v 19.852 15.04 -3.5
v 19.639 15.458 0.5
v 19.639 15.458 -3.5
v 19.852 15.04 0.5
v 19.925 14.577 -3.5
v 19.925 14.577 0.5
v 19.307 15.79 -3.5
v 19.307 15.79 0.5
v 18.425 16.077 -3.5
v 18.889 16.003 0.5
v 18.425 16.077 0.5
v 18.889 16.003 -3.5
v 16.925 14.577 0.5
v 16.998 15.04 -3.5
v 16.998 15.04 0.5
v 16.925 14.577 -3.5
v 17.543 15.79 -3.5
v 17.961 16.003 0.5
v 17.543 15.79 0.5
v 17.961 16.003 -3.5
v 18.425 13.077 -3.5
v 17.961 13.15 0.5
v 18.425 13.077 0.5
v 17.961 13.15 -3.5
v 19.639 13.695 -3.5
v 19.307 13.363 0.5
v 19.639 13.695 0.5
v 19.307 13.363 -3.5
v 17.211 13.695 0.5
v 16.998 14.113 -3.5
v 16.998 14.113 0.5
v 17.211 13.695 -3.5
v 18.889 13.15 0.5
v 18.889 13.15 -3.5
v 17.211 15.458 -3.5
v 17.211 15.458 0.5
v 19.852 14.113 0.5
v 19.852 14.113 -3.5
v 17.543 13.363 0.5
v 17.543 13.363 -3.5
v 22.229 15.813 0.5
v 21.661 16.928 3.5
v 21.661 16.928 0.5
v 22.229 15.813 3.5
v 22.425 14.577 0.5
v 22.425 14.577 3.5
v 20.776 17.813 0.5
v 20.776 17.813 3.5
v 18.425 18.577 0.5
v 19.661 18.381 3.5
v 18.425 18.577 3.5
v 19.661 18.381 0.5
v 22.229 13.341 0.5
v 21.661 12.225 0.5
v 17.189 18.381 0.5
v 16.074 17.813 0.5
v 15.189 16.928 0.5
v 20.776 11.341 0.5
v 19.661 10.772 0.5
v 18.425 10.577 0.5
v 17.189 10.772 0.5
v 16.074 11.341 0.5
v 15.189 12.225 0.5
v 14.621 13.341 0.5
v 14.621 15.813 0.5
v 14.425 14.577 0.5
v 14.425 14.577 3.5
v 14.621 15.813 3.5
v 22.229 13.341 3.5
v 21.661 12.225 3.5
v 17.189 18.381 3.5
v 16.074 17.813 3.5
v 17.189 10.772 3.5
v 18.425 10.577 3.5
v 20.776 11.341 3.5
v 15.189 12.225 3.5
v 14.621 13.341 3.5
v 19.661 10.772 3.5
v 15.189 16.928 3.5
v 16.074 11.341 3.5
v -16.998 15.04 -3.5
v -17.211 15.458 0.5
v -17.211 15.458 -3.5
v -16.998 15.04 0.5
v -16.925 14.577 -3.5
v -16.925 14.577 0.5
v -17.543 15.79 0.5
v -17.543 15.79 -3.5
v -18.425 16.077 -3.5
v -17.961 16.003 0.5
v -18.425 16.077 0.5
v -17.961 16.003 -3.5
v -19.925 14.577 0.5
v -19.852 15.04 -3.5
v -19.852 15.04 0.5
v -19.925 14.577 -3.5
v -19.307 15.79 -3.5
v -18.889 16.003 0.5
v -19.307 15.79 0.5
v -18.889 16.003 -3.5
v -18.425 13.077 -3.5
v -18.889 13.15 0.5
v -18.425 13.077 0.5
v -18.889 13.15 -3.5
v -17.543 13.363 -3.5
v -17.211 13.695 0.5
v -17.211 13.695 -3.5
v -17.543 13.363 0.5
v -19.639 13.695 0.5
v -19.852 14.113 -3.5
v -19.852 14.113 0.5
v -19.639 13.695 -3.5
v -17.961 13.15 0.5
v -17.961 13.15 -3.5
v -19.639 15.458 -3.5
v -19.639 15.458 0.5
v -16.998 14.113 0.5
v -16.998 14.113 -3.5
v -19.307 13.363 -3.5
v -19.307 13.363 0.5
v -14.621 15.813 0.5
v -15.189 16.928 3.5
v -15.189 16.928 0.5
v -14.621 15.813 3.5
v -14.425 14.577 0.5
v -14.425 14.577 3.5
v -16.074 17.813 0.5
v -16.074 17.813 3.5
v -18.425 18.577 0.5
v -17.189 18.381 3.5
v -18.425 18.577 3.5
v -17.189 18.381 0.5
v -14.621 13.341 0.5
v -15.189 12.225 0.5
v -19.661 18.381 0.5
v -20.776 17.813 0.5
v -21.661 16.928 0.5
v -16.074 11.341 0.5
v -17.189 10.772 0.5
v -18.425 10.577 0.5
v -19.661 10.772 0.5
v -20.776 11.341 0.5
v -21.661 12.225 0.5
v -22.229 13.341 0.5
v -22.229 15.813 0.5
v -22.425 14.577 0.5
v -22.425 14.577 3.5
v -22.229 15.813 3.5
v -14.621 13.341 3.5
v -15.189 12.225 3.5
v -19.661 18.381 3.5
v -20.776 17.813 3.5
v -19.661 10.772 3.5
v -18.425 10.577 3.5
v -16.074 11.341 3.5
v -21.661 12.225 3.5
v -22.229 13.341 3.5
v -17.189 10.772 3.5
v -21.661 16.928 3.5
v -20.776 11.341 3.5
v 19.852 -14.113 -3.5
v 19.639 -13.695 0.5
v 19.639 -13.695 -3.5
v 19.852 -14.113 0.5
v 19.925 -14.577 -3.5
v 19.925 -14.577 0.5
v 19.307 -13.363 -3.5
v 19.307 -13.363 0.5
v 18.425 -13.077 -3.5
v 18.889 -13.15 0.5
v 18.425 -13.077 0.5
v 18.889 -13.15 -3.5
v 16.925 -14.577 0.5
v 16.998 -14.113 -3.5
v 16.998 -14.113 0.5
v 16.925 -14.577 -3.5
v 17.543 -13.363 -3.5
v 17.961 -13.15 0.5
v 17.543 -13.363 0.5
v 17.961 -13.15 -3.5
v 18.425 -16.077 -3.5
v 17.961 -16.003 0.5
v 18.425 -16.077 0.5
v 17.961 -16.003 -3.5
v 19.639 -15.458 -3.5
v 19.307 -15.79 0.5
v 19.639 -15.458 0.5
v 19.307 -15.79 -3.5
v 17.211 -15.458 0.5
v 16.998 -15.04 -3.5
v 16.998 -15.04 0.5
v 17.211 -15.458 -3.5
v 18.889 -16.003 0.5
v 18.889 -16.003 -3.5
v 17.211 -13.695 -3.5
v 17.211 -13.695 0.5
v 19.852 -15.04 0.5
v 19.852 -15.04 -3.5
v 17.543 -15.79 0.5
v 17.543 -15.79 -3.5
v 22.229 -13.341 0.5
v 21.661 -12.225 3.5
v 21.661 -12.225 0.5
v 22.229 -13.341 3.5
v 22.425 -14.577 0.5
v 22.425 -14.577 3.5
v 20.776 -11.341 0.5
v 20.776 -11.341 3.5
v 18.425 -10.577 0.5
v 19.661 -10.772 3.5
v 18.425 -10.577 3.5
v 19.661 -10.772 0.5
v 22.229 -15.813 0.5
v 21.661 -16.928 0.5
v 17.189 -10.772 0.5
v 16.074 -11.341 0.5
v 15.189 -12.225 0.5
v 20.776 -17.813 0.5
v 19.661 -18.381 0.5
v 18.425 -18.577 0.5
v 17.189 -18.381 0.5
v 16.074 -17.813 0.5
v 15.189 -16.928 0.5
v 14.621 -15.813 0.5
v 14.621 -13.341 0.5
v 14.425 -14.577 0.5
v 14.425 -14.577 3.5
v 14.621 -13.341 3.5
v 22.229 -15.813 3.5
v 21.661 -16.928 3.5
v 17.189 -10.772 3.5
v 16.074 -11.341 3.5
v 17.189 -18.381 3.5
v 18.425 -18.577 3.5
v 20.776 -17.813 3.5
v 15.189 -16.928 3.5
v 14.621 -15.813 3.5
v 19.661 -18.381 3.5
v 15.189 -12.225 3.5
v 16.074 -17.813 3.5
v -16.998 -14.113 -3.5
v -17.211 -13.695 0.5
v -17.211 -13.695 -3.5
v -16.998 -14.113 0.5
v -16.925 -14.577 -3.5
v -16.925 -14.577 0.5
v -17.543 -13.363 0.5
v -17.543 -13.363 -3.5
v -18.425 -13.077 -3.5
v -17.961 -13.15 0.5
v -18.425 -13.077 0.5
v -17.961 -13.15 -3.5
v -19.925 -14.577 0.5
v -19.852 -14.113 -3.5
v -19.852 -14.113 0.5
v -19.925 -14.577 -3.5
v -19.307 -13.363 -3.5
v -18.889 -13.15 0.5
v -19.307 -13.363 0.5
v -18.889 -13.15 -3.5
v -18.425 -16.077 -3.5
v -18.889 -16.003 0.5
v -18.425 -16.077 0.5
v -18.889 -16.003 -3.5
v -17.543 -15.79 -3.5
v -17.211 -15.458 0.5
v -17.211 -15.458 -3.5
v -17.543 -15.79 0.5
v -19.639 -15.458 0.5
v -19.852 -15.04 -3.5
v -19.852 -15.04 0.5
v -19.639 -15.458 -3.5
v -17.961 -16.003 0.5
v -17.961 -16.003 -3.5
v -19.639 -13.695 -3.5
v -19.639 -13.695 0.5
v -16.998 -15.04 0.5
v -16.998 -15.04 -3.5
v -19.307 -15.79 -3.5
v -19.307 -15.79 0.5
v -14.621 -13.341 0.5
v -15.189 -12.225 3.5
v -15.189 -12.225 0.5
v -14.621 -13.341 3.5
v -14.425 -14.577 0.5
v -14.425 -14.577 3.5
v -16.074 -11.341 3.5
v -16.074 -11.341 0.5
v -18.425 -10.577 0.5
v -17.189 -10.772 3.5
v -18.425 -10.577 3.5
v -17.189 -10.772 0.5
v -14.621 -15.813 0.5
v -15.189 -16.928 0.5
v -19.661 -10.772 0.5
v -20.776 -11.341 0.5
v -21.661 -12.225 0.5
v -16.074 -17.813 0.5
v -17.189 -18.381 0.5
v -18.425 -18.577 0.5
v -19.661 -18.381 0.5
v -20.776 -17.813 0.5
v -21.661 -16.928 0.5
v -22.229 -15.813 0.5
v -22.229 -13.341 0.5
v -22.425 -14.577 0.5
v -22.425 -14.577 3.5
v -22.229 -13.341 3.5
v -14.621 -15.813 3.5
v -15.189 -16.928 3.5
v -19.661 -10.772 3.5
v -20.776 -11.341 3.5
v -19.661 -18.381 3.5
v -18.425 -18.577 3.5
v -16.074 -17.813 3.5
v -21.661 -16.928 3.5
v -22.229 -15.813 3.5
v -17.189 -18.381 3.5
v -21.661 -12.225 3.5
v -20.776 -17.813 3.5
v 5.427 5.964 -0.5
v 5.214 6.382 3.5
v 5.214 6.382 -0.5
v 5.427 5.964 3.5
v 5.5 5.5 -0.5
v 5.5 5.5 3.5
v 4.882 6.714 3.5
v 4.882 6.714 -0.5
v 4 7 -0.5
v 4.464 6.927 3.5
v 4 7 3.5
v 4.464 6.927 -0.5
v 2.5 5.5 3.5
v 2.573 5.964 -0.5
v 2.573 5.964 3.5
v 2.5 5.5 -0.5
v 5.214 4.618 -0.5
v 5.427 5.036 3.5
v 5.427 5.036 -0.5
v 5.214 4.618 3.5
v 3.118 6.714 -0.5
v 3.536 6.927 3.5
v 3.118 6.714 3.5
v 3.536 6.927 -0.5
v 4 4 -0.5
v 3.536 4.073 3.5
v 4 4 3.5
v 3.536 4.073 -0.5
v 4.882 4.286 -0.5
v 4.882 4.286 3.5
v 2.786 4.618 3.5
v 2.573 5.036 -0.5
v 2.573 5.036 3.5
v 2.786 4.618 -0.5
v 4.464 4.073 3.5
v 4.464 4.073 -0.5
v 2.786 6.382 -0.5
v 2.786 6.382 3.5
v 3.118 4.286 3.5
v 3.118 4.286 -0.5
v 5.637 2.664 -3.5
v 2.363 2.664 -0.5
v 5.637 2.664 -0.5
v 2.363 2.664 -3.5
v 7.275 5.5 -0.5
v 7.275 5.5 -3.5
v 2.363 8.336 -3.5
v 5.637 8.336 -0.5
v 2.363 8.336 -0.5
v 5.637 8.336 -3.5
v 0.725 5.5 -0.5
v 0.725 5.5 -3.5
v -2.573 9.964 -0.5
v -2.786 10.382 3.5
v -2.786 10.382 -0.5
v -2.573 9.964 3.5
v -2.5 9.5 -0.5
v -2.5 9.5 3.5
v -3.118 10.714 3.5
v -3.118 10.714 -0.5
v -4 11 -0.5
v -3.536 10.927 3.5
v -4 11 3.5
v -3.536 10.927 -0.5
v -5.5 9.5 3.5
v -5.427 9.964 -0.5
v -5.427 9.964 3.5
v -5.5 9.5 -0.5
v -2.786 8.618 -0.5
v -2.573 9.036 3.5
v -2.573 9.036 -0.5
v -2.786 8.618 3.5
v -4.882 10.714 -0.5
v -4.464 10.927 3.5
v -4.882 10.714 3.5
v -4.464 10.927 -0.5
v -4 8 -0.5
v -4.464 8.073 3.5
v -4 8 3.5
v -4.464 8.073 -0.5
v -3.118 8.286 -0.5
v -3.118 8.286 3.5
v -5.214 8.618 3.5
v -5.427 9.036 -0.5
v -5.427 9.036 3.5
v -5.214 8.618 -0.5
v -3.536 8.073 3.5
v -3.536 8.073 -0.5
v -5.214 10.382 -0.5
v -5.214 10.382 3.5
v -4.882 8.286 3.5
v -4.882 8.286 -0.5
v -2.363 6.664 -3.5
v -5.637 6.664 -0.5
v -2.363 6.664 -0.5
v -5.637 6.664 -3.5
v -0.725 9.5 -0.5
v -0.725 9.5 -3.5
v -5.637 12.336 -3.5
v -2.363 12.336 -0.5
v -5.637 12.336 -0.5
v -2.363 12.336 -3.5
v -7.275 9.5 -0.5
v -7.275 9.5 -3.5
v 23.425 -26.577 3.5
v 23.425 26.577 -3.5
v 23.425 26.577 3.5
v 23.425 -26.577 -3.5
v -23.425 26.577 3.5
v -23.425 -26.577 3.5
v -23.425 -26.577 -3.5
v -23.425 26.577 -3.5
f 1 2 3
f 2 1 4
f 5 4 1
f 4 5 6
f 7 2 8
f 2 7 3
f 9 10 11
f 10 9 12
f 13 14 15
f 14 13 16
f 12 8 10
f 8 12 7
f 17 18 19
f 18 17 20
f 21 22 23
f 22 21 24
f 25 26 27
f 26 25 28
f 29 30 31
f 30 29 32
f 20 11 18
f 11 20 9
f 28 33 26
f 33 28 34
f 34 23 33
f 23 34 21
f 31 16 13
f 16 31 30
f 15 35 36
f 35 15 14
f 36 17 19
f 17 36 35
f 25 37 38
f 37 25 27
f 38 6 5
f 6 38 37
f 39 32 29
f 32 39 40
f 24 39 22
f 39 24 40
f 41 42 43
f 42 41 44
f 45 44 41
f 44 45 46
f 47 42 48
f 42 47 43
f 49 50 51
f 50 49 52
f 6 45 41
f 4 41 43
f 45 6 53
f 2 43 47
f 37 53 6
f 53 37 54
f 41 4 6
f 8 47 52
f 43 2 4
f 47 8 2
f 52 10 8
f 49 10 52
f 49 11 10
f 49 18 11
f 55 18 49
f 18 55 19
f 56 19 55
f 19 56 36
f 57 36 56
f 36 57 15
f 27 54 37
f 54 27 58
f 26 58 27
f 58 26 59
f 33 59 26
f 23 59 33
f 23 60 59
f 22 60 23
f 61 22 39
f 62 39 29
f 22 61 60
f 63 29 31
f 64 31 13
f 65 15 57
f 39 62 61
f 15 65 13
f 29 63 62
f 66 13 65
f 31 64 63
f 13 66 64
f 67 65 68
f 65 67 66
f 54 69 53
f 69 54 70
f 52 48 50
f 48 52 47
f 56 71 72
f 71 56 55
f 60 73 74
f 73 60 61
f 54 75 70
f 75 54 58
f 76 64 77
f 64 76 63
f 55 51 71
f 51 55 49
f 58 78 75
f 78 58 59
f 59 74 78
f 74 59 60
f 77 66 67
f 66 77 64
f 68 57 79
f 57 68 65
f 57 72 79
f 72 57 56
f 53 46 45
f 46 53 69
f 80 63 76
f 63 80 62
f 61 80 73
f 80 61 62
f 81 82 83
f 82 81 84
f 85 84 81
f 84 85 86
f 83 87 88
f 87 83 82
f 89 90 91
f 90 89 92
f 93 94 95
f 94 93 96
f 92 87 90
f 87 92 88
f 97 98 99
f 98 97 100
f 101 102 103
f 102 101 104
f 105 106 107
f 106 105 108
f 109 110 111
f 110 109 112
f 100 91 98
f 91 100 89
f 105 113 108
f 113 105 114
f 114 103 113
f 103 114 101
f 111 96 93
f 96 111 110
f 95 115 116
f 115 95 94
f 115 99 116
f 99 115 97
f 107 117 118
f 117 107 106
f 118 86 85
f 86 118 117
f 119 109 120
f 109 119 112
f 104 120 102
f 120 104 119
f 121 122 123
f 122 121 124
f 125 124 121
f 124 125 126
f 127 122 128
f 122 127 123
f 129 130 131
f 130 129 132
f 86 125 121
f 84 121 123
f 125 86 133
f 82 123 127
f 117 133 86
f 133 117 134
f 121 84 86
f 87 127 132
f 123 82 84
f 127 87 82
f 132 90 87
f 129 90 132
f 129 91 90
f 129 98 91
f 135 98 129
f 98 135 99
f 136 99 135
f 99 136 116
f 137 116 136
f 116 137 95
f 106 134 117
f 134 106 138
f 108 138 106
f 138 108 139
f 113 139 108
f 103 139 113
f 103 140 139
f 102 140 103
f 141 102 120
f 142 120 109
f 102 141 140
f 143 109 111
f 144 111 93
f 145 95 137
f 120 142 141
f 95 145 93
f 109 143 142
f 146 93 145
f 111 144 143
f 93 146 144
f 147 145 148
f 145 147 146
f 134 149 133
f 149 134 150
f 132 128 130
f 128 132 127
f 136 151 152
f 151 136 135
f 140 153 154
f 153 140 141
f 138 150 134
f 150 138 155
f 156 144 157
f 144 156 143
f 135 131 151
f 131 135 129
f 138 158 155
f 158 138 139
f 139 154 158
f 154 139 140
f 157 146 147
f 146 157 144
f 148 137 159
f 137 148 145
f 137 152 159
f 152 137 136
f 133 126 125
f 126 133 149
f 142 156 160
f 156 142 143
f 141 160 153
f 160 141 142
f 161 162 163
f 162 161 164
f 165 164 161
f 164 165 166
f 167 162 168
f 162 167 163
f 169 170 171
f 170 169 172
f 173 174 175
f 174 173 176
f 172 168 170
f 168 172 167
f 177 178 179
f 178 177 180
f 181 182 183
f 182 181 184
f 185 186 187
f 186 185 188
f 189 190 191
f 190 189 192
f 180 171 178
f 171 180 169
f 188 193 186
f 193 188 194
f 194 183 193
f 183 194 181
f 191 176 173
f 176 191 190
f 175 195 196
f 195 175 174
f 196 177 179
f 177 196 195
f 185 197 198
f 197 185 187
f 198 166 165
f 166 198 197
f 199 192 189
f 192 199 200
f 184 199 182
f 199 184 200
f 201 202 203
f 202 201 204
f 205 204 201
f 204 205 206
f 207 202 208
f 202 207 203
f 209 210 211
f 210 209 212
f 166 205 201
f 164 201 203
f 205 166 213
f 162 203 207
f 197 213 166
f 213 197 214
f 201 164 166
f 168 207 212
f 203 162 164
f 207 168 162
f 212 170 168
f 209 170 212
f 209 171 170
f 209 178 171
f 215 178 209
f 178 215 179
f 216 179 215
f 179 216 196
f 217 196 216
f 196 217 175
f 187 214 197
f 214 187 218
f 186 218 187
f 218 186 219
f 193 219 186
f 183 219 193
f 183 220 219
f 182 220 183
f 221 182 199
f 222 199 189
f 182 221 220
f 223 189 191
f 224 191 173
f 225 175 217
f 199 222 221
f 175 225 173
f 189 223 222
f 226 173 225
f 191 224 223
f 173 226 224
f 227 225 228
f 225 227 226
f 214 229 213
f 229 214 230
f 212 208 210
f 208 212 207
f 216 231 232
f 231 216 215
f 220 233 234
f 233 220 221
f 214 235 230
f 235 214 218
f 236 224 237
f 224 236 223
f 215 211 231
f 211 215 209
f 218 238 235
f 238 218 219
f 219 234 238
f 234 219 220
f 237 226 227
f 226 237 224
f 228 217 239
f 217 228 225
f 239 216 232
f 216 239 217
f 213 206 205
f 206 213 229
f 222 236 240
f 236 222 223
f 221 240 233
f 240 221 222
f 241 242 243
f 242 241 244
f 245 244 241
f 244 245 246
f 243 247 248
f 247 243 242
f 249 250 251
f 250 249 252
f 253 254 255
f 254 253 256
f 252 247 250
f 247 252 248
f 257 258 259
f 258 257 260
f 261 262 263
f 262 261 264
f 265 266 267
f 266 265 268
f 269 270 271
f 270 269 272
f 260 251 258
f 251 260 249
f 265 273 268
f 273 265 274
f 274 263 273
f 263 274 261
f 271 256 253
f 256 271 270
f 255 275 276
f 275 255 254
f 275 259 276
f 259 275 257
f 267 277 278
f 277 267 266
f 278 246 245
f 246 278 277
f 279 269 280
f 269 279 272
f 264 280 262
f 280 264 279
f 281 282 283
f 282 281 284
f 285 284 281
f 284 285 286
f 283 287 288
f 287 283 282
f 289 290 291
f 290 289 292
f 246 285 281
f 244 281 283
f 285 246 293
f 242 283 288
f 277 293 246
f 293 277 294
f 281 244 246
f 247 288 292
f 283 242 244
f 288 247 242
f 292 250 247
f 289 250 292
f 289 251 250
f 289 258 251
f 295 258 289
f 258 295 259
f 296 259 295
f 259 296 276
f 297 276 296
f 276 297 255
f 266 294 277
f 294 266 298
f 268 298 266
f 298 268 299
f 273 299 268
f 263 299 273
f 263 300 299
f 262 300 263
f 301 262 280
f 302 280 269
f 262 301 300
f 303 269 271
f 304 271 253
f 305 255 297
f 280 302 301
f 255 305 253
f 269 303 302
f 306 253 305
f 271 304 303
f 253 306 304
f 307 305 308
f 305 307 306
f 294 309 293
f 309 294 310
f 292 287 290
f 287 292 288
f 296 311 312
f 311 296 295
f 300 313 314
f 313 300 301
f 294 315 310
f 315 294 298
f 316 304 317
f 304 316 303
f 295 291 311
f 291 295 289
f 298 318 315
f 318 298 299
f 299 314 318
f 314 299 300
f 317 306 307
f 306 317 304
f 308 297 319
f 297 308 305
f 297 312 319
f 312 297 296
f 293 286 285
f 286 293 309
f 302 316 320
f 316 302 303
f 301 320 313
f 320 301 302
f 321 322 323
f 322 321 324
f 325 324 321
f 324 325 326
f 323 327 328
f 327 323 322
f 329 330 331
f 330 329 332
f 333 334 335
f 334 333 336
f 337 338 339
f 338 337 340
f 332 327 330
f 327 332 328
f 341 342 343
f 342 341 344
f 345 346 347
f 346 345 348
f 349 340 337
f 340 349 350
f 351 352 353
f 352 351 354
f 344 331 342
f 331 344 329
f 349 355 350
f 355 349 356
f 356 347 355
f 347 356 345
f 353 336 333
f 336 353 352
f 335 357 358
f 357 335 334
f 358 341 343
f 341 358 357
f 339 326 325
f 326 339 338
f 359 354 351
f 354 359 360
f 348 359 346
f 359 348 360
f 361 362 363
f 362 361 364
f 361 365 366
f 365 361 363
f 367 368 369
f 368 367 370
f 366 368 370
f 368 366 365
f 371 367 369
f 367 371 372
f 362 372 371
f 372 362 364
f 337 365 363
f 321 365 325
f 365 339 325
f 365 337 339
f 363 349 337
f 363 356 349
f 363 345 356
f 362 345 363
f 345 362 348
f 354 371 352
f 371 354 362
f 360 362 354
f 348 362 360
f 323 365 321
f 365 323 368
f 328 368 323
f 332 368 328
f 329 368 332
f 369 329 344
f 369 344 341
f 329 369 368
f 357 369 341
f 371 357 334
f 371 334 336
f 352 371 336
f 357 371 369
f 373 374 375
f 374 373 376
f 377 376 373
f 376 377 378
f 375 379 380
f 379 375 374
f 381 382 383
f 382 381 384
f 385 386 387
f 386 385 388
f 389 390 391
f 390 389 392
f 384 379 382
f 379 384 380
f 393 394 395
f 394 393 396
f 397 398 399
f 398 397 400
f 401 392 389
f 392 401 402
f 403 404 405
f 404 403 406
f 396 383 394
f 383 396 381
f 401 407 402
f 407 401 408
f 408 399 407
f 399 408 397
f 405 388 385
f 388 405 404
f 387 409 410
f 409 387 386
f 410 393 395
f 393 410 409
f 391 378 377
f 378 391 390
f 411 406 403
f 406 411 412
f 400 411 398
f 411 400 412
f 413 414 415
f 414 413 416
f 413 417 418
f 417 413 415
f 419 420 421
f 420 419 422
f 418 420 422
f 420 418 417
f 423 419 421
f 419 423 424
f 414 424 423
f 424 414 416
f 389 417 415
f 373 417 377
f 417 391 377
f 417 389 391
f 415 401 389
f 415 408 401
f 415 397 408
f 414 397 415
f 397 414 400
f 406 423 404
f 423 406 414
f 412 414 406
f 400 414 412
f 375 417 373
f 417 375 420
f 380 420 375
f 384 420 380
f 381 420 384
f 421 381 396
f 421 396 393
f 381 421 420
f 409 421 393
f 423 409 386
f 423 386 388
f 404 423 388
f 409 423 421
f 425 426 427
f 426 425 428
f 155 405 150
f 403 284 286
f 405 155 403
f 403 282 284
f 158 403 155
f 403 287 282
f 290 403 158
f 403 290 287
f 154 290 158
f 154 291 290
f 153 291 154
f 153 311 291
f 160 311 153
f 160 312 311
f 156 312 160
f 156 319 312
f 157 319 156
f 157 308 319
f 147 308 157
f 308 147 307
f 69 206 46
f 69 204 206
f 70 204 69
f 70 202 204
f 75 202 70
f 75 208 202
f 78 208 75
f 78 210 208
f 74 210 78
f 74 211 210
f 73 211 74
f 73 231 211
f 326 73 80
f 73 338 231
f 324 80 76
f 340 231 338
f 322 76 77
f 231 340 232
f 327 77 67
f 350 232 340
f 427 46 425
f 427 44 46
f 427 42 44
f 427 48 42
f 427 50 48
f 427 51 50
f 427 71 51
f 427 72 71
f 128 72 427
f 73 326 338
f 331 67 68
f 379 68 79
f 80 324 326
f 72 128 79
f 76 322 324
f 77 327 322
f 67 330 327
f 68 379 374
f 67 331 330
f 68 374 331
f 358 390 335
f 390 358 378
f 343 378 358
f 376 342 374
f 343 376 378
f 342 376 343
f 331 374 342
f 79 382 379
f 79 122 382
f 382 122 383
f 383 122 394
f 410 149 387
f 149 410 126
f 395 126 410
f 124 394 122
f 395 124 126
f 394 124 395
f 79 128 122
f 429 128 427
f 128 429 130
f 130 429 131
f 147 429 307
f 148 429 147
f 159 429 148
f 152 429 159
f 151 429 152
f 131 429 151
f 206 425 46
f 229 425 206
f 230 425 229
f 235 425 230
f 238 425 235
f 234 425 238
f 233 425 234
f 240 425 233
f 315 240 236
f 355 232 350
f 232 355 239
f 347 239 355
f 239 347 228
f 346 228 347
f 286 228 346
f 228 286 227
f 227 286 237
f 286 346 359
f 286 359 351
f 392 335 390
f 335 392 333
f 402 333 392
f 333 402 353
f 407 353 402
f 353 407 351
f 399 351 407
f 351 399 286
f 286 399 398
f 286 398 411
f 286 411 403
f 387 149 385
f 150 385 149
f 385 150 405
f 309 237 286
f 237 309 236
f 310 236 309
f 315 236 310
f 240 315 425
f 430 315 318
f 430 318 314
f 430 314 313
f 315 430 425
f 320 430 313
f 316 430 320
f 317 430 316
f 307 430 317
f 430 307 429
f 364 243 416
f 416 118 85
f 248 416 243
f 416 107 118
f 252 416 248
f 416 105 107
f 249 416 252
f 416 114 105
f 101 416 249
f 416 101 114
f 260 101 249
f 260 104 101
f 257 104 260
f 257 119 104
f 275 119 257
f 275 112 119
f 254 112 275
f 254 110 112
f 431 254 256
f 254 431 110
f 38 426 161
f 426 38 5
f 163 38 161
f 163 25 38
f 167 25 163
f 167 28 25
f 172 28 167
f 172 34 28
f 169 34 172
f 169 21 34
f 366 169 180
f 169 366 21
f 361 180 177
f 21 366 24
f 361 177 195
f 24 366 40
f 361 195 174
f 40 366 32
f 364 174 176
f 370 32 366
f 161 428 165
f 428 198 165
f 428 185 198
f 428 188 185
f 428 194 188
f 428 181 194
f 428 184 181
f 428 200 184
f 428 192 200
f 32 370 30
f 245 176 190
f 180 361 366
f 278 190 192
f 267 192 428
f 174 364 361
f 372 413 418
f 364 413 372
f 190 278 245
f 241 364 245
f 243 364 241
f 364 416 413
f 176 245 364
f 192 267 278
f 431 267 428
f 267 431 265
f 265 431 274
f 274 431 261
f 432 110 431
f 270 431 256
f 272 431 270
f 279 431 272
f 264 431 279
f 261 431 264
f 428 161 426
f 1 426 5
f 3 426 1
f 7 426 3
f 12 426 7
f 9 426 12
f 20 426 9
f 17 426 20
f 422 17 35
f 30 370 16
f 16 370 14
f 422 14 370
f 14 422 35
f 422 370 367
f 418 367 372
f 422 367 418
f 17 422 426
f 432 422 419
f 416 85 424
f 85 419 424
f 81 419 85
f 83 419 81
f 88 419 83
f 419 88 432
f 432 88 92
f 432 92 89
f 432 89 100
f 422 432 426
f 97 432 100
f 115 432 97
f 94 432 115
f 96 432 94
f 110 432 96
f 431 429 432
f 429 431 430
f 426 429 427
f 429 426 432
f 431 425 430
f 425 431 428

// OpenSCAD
// file: ../../parts/switch.scad
/*
    SWITCH
*/

switch_x = 19.8;
switch_y = 11.5;
switch_y_total = 15.3;
switch_z = 6.4;
switch_diameter = 2; // 2.5

module switch() {
	
	//difference() {
		
		union() {
				
			translate([0, (switch_y / 2) - 2.9, 0])
			cube([switch_x, switch_y, switch_z], center = true);
			
			switch_pin_y = switch_y_total - switch_y;
			color([0, 1, 0, 0.7])
			translate([0, -(switch_pin_y / 2) - 2.9 + 0.01, 0])
			cube([switch_x, switch_pin_y, switch_z], center = true);
		}
		
		color([1, 0, 0, 0.7])
		union() {
			translate([-9.5 / 2, 0, 0])
			cylinder (r=(switch_diameter / 2), h=20 , center=true);
			translate([ 9.5 / 2, 0, 0])
			cylinder (r=(switch_diameter / 2), h=20 , center=true);
		}
	//}
}
// ss-5gl
// file: ../config.scad
include <../parts/switch.scad>


rod_side = 16;
rod_length = 700;

rod_horizontal_spacing	= 120; // center to center / min 105
rod_vertical_spacing	= 2;

bearing_outer_diameter = 10;
bearing_inner_diameter = 3;
bearing_height = 4;

    // avoid touching this except if you know what's you're doing
    
bearing_holder_spacing_1 = 0.7; // space between bearing flat sides and piece
bearing_holder_spacing_2 = 1; // space between bearing perimeter and piece
bearing_holder_width = 3; // thickness of pieces holding the bearings
bearing_screw_access_size = 10; // the size of the cube to remove to be able to put in place the bearing screw

screw_exceed = 3; // how much you want a screew can exceed in length
    // default M3 screws size
screw_diameter = 3; // the diameter of your screws
    // default M3 nuts size
screws_nuts_side_min = 5.75; // 5.4min
screws_nuts_side_max = 6.55; // default is 6mm but we add some margin
screw_nuts_height = 3; // default is 2.4mm
screws_material_holder_min_size = 3; // the minimum of material arround a screw
screws_attach_length = 10; // the min length of the screew which will attach the 2 pieces

rod_holder_size = 10; // the length of material which will tighten the carriage rods => 10 for Y, 7 for X

rod_piece_spacing = 1; // space between rod and piece
   
pieces_spacing = 1; // the space between the 2 pieces

motor_holder_thickness = 4; // thickness of motor support


/*
    Computed variables for future use
*/

rod_remove_side = rod_side + (rod_piece_spacing * 2);

    // represent the min size of material which should warp a screw
screw_virtual_holder_side = screw_diameter + (screws_material_holder_min_size * 2);

	// represent the area taken by bearings
bearing_virtual_cube_side = (((rod_side / 2) + bearing_outer_diameter + (bearing_height / 2) + bearing_holder_spacing_1 + bearing_holder_width) / sqrt(2)) * 2;

    // the outers screews could touch the rod, so we need to compute an offset
space_rod_outer = (bearing_virtual_cube_side - (rod_remove_side * sqrt(2))) / 2; // the minimum must be screw_virtual_holder_side
echo("space_rod_outer", space_rod_outer);
outer_screw_offset = abs(screw_virtual_holder_side - space_rod_outer);

	// base piece size
base_block_x = rod_horizontal_spacing + (rod_side * sqrt(2)) + (screw_virtual_holder_side * 2);  
base_block_y = bearing_virtual_cube_side + rod_holder_size /*+ screw_virtual_holder_side*/ + outer_screw_offset;
base_block_z = max(bearing_virtual_cube_side, rod_remove_side * sqrt(2) + motor_holder_thickness * 2);


 base_block_remove_x = rod_horizontal_spacing - (rod_side * sqrt(2)) - (screw_virtual_holder_side * 2);
base_block_remove_y = base_block_y;
base_block_remove_z = max(rod_remove_side * sqrt(2), base_block_z - (motor_holder_thickness * 2));


carriage_block_x = (rod_side * sqrt(2)) + (screw_virtual_holder_side * 2);

/*
    RODS
*/

module rod(show_rods) {
    if(show_rods) {
        color([0.7, 0.7, 0.7])
        rotate([45, 0, 0])
        cube([rod_length, rod_side, rod_side], center = true);
    }
}
// draw a rod


module screw() {
    screw_height = 50;
    cylinder (r=(screw_diameter / 2), h=screw_height , center=true);
}




module base_screw_remove_tighten() {
    
    
    color([1, 0, 0, 0.7])
    union() {
        
        screw_length = base_block_z + 1;
        
        cylinder (r=(screw_diameter / 2), h=screw_length, center=true);
    
        nuts_remove_length = (screw_length / 2) - (screws_attach_length / 2);
    
        translate([0, 0, (screw_length / 2) - (nuts_remove_length / 2)])
        cylinder ($fn = 6, r=(screws_nuts_side_max / 2), h=nuts_remove_length, center=true);
        
        translate([0, 0, -((screw_length / 2) - (nuts_remove_length / 2))])
        cylinder ($fn = 6, r=(screws_nuts_side_max / 2), h=nuts_remove_length, center=true);
    }
}
// base_screw_remove_tighten


/**
	CARRIAGE
**/

module carriage_block_fix_screw(pos_x, pos_y, height = 7) {
	fixation_offset_x = 5;
	fixation_offset_y = 12;
	
	x_offset = (carriage_block_x / 2) - fixation_offset_x;
	y_offset = (base_block_y / 2) - fixation_offset_y;
	
	screw_wacher_diameter = 8;
	screw_wacher_z = 3;
	screw_wacher_z_offset = (height / 2);
	
	translate([(x_offset * pos_x), (y_offset * pos_y), 0])
	union() {
		screw();
		translate([0, 0, screw_wacher_z_offset])
		cylinder (r=(screw_wacher_diameter / 2), h=(screw_wacher_z * 2) , center=true);
	}
}
//carriage_block_fix_screw


module carriage_block_fix(height = 7) {
	carriage_block_fix_screw(+1, +1, height);
	carriage_block_fix_screw(-1, +1, height);
	carriage_block_fix_screw(+1, -1, height);
	carriage_block_fix_screw(-1, -1, height);
}
//carriage_block_fix


/*
    SWITCH
*/

switch_x = 19.8;
switch_y = 11.5;
switch_y_total = 15.3;
switch_z = 6.4;
switch_diameter = 2; // 2.5

module switch() {
	
	//difference() {
		
		union() {
				
			translate([0, (switch_y / 2) - 2.9, 0])
			cube([switch_x, switch_y, switch_z], center = true);
			
			switch_pin_y = switch_y_total - switch_y;
			color([0, 1, 0, 0.7])
			translate([0, -(switch_pin_y / 2) - 2.9 + 0.01, 0])
			cube([switch_x, switch_pin_y, switch_z], center = true);
		}
		
		color([1, 0, 0, 0.7])
		union() {
			translate([-9.5 / 2, 0, 0])
			cylinder (r=(switch_diameter / 2), h=20 , center=true);
			translate([ 9.5 / 2, 0, 0])
			cylinder (r=(switch_diameter / 2), h=20 , center=true);
		}
	//}
}
// ss-5gl
// main file
$fn=20;

include <../../XYZ/config.scad>

rod_side = 20.4;
material_thickness = 4;

cable_chain_10x20_holder_frame_length = 16;

cable_chain_10x20_holder_frame_x = rod_side + (material_thickness * 2);
cable_chain_10x20_holder_frame_y = rod_side + cable_chain_10x20_holder_frame_length;
cable_chain_10x20_holder_frame_z = 7;

cable_chain_10x20_holder_frame_y_offset = cable_chain_10x20_holder_frame_length / 2;


cable_chain_10x20_holder_carriage_x = (rod_side * sqrt(2)) + (screw_virtual_holder_side * 2);
cable_chain_10x20_holder_carriage_y = base_block_y;
cable_chain_10x20_holder_carriage_z = 7;

/*
    ROD FIX
*/

module positioned_rod() {
	color([0.7, 0.7, 0.7])
	rotate([0, 90, 0])
	translate([0, -0.001, 0])
  cube([1000, rod_side, rod_side], center = true);
}
// positioned_rod
//positioned_rod();


module fix_screw_rod() {
	color([1, 0, 0])
	rotate([0, 90, 0])	
	screw();
}
// fix_screw_rod

module fix_screw_chain(pos_x) {
	positioned_screws_y_dist = 2;
	
	positioned_screws_x_offset = 4;
	positioned_screws_y_offset = 7.5;
	positioned_screws_z_offset = -(screws_attach_length / 2) - 3;
	
	x_offset = positioned_screws_x_offset;
//	y_offset = (rod_side / 2) + positioned_screws_y_offset - positioned_screws_y_dist * pos_x;
	y_offset = positioned_screws_y_offset - positioned_screws_y_dist * pos_x;
	
	translate([x_offset * pos_x, y_offset, positioned_screws_z_offset])
	base_screw_remove_tighten();
}
// fix_screw_chain

module positioned_screws() {
	fix_screw_chain(+1);
	fix_screw_chain(-1);
}
// positioned_screws

module cable_chain_10x20_holder_frame_base() {
	color([0.7, 0.7, 0, 0.7])
	translate([0, cable_chain_10x20_holder_frame_y_offset, 0])
	cube([cable_chain_10x20_holder_frame_x, cable_chain_10x20_holder_frame_y, cable_chain_10x20_holder_frame_z], center = true);
}
// cable_chain_10x20_holder_base


module cable_chain_10x20_holder_carriage_base() {
	color([0.7, 0.7, 0, 0.7])
	//	translate([0, base_block_y_offset, base_fix_block_z_offset])
	cube([cable_chain_10x20_holder_carriage_x, cable_chain_10x20_holder_carriage_y, cable_chain_10x20_holder_carriage_z], center = true);
}
// cable_chain_10x20_holder_carriage_base


module cable_chain_10x20_holder_frame() {
	difference() {
		cable_chain_10x20_holder_frame_base();
		
		union() {
			positioned_rod();
			fix_screw_rod();
			translate([0, (rod_side / 2), (cable_chain_10x20_holder_frame_z / 2)])
			positioned_screws();
		}
	}
}
// cable_chain_10x20_holder

module cable_chain_10x20_holder_carriage() {
	difference() {
		cable_chain_10x20_holder_carriage_base();
		carriage_block_fix(cable_chain_10x20_holder_carriage_z);
		
		
		mirror([0, 0, -1])
		translate([0, 0, (cable_chain_10x20_holder_carriage_z / 2)])
		positioned_screws();
	}
}
// cable_chain_10x20_holder_carriage

//cable_chain_10x20_holder_frame();
cable_chain_10x20_holder_carriage();
